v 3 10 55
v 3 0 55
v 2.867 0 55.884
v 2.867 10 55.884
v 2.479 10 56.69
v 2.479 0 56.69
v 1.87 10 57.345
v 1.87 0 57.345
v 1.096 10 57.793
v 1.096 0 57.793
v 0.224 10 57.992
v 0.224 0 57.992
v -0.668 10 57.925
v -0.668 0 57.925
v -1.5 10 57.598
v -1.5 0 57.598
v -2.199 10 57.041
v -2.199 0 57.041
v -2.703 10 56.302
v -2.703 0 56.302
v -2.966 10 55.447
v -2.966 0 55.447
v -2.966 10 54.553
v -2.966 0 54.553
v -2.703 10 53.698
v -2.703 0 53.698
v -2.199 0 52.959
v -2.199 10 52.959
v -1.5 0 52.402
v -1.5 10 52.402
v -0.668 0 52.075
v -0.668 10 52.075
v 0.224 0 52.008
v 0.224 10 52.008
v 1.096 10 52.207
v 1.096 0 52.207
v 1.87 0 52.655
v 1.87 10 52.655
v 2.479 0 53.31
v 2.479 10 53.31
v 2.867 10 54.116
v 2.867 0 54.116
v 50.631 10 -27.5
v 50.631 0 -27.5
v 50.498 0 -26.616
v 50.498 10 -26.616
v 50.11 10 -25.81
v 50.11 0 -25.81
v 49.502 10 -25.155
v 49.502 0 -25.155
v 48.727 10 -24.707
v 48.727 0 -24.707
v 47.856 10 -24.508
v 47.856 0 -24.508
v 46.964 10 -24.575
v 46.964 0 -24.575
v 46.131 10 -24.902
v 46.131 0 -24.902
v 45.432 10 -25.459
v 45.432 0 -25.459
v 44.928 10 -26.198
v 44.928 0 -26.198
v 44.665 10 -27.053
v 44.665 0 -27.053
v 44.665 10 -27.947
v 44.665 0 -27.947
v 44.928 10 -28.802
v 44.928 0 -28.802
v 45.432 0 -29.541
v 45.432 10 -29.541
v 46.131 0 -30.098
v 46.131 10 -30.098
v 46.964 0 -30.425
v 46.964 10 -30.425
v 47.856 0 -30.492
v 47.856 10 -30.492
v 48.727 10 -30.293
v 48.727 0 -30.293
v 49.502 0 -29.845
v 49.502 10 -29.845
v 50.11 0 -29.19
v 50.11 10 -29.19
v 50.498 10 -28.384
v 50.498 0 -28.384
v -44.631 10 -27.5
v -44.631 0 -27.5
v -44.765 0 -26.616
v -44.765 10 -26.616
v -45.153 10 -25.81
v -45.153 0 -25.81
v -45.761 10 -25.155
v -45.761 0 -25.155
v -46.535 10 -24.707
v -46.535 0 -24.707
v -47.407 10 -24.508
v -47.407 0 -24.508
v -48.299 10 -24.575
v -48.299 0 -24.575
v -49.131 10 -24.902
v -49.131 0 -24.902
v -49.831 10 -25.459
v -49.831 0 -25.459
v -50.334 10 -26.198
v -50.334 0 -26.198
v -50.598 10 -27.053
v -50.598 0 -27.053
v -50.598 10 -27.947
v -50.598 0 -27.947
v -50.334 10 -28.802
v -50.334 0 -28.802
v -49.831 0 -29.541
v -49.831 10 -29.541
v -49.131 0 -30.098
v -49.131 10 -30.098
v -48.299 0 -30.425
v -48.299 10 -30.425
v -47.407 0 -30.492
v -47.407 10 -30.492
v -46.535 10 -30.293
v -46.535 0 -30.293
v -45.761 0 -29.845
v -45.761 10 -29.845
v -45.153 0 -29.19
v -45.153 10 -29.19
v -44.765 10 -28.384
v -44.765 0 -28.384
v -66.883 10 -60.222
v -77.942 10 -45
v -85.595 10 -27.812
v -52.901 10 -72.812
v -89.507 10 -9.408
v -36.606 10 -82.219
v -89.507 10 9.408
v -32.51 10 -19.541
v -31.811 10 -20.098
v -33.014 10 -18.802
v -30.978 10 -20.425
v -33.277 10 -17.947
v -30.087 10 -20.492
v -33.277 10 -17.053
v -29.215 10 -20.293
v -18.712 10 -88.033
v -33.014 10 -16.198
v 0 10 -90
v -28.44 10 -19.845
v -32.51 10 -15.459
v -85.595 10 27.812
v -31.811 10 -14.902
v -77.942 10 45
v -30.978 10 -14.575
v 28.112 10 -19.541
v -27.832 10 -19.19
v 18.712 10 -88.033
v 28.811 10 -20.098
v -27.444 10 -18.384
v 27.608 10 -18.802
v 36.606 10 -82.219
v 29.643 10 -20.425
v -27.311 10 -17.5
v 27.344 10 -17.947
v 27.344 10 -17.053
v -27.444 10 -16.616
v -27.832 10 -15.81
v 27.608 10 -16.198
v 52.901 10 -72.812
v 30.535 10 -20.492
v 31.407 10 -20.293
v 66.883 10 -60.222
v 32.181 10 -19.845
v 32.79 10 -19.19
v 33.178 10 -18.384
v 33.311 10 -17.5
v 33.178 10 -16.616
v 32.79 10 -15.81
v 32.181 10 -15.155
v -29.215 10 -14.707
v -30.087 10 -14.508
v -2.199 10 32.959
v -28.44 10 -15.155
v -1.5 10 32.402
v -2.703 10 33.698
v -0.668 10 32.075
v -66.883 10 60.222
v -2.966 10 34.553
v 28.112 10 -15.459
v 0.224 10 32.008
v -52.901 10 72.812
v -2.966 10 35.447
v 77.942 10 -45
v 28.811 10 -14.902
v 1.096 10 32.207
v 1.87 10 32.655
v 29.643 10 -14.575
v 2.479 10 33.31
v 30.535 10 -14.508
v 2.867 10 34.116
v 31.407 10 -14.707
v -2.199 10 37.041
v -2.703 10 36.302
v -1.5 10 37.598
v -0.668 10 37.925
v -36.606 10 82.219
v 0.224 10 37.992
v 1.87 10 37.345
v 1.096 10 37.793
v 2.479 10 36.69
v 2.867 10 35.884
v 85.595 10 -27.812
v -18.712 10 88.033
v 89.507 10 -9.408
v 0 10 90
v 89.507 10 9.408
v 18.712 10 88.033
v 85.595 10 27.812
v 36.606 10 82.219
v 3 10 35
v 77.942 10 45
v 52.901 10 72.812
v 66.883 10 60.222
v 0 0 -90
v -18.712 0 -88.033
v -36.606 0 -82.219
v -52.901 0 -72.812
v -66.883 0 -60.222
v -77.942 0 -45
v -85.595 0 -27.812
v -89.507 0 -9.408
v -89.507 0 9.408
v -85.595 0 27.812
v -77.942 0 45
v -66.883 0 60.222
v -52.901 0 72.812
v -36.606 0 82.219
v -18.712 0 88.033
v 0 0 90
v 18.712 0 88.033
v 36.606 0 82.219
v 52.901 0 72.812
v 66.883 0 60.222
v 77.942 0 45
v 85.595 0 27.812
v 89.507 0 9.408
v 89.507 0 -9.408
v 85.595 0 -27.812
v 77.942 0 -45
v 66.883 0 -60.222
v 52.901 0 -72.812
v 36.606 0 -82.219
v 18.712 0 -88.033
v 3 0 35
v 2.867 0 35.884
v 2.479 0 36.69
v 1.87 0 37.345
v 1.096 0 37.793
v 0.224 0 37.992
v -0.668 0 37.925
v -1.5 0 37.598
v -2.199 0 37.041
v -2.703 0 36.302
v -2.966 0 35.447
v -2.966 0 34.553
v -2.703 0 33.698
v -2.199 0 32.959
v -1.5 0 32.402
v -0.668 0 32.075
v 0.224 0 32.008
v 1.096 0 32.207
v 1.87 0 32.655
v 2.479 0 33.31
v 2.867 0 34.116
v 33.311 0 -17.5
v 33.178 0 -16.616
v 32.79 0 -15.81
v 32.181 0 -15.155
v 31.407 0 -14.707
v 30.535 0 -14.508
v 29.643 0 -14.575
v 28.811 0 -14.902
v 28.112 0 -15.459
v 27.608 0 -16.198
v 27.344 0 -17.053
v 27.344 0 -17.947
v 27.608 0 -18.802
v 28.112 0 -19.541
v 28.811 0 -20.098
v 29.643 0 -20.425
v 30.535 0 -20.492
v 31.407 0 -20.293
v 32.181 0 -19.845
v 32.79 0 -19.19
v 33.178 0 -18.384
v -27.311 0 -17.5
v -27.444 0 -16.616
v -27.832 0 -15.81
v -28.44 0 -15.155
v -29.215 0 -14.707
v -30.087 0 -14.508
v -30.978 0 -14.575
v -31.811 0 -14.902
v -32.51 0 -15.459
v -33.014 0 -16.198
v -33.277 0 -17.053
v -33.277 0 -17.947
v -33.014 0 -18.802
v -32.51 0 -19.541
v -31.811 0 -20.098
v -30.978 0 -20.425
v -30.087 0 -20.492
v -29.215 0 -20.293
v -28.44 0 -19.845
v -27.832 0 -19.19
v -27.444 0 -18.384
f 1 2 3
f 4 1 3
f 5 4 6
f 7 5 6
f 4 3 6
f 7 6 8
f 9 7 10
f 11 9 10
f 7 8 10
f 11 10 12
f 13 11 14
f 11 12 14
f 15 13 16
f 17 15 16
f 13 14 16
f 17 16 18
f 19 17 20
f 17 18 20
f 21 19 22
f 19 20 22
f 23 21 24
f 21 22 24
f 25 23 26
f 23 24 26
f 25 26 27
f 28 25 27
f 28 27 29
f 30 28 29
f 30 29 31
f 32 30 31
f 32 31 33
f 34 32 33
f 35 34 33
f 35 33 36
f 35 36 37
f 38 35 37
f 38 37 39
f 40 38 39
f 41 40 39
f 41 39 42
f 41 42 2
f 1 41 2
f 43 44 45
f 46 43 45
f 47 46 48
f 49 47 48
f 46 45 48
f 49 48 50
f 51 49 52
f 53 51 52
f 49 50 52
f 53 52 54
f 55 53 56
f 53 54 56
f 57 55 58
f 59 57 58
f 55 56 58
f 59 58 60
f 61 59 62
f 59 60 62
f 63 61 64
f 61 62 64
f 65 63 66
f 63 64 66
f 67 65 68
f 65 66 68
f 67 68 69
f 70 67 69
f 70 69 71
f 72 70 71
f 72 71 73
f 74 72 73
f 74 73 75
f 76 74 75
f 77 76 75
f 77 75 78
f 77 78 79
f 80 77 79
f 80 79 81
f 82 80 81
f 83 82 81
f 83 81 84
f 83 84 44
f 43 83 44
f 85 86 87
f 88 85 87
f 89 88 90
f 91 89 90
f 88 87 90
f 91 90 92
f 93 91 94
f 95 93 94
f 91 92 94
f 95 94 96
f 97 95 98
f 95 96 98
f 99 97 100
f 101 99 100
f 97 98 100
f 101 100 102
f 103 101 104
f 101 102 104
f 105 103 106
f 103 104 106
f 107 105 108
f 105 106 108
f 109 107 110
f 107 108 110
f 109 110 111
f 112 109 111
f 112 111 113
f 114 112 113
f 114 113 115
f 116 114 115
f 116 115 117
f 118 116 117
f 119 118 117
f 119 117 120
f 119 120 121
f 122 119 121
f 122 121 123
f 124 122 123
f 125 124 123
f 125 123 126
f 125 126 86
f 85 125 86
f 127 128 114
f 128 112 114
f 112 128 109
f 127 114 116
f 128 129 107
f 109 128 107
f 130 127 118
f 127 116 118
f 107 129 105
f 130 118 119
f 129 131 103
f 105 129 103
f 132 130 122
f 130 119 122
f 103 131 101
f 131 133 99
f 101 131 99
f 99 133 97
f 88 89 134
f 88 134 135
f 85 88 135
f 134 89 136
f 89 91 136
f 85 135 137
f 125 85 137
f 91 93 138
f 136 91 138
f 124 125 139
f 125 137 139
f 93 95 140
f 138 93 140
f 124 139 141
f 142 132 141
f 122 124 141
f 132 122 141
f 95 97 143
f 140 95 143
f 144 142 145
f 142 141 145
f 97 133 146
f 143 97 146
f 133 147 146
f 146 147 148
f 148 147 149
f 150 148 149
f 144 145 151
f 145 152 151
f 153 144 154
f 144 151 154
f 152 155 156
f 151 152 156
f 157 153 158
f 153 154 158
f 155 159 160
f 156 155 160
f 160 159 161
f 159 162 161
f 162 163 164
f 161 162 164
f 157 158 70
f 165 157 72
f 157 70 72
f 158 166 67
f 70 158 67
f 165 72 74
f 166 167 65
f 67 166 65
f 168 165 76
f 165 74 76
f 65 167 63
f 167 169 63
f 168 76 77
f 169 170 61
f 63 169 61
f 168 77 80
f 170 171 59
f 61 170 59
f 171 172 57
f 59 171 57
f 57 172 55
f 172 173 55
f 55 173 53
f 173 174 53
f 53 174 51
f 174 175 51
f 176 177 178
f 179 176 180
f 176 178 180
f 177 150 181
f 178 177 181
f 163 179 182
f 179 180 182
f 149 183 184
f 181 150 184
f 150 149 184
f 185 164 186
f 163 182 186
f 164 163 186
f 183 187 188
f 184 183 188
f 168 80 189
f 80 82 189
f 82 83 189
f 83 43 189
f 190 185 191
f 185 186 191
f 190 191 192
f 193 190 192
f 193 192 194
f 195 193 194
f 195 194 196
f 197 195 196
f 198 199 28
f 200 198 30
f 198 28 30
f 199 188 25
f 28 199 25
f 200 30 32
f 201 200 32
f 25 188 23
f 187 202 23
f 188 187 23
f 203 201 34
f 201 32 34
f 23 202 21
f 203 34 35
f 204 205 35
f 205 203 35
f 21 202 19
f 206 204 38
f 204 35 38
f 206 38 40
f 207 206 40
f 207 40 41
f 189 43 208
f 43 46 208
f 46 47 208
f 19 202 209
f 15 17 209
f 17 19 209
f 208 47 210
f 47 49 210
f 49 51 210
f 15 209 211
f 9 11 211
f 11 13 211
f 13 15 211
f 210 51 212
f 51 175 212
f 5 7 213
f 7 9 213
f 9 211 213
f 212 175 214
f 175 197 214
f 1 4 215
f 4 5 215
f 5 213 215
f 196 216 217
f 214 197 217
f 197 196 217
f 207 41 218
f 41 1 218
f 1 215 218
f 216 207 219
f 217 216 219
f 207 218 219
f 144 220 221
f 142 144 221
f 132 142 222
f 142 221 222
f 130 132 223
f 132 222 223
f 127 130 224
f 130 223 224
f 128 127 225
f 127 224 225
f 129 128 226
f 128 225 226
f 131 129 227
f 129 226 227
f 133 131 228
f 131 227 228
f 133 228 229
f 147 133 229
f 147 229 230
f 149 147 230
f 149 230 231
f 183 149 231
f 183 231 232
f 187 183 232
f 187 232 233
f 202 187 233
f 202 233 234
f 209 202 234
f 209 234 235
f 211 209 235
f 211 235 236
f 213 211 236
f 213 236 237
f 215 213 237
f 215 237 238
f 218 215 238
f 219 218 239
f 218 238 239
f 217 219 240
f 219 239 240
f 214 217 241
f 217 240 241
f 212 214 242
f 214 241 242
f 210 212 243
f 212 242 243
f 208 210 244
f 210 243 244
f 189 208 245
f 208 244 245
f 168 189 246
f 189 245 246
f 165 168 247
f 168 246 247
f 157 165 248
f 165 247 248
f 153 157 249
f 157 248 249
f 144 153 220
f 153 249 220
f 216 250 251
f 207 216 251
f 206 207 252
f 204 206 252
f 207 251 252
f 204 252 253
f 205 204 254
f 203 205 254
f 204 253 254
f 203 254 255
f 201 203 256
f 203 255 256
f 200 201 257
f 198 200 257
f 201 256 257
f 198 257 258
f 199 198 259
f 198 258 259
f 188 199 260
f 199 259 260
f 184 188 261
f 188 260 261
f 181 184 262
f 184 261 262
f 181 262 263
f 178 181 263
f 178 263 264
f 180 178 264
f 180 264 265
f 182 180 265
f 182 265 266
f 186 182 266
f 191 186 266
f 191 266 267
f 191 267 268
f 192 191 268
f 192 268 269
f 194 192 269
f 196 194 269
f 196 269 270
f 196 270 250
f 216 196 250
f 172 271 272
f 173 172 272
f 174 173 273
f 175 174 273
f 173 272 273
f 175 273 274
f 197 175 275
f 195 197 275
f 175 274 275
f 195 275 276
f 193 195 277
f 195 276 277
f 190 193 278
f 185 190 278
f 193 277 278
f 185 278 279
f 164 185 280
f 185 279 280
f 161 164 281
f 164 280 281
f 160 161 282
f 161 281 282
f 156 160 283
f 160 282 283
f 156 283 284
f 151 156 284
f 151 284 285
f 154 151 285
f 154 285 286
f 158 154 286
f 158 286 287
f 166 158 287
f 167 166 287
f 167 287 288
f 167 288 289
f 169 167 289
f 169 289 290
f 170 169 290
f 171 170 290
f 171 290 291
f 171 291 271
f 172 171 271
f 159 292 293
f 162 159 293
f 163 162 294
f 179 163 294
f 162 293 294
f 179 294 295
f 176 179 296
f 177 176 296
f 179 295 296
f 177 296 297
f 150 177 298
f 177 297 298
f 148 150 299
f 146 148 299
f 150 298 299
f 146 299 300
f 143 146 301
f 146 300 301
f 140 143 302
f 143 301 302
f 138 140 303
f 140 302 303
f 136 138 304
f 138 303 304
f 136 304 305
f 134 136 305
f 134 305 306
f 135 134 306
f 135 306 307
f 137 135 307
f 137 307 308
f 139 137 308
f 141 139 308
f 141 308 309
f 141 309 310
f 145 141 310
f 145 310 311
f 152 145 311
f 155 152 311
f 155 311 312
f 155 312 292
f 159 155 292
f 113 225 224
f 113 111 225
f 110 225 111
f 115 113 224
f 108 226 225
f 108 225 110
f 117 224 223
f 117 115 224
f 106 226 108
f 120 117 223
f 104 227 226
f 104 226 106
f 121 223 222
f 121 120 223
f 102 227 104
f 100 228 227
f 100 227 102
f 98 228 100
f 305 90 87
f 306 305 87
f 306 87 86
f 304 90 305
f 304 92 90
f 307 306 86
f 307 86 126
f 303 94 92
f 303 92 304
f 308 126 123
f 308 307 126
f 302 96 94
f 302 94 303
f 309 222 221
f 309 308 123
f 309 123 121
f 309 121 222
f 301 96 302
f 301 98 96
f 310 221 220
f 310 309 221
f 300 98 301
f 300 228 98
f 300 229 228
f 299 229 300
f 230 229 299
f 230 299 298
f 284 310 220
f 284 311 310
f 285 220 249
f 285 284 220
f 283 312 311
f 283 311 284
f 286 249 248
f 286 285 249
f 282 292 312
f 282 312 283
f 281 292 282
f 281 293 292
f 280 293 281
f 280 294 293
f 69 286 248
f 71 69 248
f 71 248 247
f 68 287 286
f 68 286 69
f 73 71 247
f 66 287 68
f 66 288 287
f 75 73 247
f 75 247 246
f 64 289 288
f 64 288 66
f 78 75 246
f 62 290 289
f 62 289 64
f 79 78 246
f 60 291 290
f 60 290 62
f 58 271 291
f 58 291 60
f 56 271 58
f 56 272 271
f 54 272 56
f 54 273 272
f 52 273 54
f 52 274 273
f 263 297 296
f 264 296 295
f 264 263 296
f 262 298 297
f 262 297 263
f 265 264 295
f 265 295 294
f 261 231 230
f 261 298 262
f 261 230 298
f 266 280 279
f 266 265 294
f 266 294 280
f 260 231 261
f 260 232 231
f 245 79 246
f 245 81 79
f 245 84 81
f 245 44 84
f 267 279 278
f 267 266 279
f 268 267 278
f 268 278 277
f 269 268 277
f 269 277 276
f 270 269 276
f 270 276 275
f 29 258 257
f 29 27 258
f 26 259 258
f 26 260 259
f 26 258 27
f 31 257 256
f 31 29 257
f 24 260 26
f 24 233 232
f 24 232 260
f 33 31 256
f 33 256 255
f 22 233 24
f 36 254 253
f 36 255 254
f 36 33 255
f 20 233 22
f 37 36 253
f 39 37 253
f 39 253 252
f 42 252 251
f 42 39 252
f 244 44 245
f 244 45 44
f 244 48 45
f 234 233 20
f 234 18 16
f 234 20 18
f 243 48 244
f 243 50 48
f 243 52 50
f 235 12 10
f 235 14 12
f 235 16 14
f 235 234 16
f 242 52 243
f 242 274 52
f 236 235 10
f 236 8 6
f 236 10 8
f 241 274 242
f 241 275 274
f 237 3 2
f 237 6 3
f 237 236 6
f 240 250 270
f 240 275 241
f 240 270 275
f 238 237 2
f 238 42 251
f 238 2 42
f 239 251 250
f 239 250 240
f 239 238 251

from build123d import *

# Parameters (mm, degrees)
F0_W     = 180
F0_H     = 180
F1_DEPTH = 10
F2_R     = 3
F3_DEPTH = 10.001
F5_DEPTH = 10.001


with BuildPart() as f1:
    # F0 (on Front) → F1 (new body)
    with BuildSketch(Plane.XZ):
        Rectangle(F0_W, F0_H)
    extrude(amount=-F1_DEPTH)

    # F2 (on face) → F3 (cut, through all)
    with BuildSketch(Plane.XZ):
        with Locations((0, 55)):
            Circle(F2_R)
        with Locations((0, 35)):
            Circle(F2_R)
        with Locations((-30.3108891325, -17.5)):
            Circle(F2_R)
        with Locations((-47.6313972081, -27.5)):
            Circle(F2_R)
        with Locations((30.3108891325, -17.5)):
            Circle(F2_R)
        with Locations((47.6313972081, -27.5)):
            Circle(F2_R)
    extrude(amount=-F3_DEPTH, mode=Mode.SUBTRACT)

    # F4 (on face) → F5 (cut, through all)
    with BuildSketch(Plane.XZ):
        with BuildLine():
            ThreePointArc((-90, 2.079e-07), (-63.6396103357, 63.6396102779), (-2.896e-07, 90))
            Line((-2.896e-07, 90), (-90, 90))
            Line((-90, 90), (-90, 2.079e-07))
        make_face()
        with BuildLine():
            ThreePointArc((-2.896e-07, 90), (63.6396102044, 63.6396104092), (90, 0))
            Line((90, 0), (90, 90))
            Line((90, 90), (-2.896e-07, 90))
        make_face()
        with BuildLine():
            Line((90, -90), (90, 0))
            ThreePointArc((90, 0), (63.6396104617, -63.6396101519), (4.381e-07, -90))
            Line((4.381e-07, -90), (90, -90))
        make_face()
        with BuildLine():
            Line((-90, -90), (4.381e-07, -90))
            ThreePointArc((4.381e-07, -90), (-63.6396102254, -63.6396103882), (-90, 2.079e-07))
            Line((-90, 2.079e-07), (-90, -90))
        make_face()
    extrude(amount=-F5_DEPTH, mode=Mode.SUBTRACT)


solid = f1.part
